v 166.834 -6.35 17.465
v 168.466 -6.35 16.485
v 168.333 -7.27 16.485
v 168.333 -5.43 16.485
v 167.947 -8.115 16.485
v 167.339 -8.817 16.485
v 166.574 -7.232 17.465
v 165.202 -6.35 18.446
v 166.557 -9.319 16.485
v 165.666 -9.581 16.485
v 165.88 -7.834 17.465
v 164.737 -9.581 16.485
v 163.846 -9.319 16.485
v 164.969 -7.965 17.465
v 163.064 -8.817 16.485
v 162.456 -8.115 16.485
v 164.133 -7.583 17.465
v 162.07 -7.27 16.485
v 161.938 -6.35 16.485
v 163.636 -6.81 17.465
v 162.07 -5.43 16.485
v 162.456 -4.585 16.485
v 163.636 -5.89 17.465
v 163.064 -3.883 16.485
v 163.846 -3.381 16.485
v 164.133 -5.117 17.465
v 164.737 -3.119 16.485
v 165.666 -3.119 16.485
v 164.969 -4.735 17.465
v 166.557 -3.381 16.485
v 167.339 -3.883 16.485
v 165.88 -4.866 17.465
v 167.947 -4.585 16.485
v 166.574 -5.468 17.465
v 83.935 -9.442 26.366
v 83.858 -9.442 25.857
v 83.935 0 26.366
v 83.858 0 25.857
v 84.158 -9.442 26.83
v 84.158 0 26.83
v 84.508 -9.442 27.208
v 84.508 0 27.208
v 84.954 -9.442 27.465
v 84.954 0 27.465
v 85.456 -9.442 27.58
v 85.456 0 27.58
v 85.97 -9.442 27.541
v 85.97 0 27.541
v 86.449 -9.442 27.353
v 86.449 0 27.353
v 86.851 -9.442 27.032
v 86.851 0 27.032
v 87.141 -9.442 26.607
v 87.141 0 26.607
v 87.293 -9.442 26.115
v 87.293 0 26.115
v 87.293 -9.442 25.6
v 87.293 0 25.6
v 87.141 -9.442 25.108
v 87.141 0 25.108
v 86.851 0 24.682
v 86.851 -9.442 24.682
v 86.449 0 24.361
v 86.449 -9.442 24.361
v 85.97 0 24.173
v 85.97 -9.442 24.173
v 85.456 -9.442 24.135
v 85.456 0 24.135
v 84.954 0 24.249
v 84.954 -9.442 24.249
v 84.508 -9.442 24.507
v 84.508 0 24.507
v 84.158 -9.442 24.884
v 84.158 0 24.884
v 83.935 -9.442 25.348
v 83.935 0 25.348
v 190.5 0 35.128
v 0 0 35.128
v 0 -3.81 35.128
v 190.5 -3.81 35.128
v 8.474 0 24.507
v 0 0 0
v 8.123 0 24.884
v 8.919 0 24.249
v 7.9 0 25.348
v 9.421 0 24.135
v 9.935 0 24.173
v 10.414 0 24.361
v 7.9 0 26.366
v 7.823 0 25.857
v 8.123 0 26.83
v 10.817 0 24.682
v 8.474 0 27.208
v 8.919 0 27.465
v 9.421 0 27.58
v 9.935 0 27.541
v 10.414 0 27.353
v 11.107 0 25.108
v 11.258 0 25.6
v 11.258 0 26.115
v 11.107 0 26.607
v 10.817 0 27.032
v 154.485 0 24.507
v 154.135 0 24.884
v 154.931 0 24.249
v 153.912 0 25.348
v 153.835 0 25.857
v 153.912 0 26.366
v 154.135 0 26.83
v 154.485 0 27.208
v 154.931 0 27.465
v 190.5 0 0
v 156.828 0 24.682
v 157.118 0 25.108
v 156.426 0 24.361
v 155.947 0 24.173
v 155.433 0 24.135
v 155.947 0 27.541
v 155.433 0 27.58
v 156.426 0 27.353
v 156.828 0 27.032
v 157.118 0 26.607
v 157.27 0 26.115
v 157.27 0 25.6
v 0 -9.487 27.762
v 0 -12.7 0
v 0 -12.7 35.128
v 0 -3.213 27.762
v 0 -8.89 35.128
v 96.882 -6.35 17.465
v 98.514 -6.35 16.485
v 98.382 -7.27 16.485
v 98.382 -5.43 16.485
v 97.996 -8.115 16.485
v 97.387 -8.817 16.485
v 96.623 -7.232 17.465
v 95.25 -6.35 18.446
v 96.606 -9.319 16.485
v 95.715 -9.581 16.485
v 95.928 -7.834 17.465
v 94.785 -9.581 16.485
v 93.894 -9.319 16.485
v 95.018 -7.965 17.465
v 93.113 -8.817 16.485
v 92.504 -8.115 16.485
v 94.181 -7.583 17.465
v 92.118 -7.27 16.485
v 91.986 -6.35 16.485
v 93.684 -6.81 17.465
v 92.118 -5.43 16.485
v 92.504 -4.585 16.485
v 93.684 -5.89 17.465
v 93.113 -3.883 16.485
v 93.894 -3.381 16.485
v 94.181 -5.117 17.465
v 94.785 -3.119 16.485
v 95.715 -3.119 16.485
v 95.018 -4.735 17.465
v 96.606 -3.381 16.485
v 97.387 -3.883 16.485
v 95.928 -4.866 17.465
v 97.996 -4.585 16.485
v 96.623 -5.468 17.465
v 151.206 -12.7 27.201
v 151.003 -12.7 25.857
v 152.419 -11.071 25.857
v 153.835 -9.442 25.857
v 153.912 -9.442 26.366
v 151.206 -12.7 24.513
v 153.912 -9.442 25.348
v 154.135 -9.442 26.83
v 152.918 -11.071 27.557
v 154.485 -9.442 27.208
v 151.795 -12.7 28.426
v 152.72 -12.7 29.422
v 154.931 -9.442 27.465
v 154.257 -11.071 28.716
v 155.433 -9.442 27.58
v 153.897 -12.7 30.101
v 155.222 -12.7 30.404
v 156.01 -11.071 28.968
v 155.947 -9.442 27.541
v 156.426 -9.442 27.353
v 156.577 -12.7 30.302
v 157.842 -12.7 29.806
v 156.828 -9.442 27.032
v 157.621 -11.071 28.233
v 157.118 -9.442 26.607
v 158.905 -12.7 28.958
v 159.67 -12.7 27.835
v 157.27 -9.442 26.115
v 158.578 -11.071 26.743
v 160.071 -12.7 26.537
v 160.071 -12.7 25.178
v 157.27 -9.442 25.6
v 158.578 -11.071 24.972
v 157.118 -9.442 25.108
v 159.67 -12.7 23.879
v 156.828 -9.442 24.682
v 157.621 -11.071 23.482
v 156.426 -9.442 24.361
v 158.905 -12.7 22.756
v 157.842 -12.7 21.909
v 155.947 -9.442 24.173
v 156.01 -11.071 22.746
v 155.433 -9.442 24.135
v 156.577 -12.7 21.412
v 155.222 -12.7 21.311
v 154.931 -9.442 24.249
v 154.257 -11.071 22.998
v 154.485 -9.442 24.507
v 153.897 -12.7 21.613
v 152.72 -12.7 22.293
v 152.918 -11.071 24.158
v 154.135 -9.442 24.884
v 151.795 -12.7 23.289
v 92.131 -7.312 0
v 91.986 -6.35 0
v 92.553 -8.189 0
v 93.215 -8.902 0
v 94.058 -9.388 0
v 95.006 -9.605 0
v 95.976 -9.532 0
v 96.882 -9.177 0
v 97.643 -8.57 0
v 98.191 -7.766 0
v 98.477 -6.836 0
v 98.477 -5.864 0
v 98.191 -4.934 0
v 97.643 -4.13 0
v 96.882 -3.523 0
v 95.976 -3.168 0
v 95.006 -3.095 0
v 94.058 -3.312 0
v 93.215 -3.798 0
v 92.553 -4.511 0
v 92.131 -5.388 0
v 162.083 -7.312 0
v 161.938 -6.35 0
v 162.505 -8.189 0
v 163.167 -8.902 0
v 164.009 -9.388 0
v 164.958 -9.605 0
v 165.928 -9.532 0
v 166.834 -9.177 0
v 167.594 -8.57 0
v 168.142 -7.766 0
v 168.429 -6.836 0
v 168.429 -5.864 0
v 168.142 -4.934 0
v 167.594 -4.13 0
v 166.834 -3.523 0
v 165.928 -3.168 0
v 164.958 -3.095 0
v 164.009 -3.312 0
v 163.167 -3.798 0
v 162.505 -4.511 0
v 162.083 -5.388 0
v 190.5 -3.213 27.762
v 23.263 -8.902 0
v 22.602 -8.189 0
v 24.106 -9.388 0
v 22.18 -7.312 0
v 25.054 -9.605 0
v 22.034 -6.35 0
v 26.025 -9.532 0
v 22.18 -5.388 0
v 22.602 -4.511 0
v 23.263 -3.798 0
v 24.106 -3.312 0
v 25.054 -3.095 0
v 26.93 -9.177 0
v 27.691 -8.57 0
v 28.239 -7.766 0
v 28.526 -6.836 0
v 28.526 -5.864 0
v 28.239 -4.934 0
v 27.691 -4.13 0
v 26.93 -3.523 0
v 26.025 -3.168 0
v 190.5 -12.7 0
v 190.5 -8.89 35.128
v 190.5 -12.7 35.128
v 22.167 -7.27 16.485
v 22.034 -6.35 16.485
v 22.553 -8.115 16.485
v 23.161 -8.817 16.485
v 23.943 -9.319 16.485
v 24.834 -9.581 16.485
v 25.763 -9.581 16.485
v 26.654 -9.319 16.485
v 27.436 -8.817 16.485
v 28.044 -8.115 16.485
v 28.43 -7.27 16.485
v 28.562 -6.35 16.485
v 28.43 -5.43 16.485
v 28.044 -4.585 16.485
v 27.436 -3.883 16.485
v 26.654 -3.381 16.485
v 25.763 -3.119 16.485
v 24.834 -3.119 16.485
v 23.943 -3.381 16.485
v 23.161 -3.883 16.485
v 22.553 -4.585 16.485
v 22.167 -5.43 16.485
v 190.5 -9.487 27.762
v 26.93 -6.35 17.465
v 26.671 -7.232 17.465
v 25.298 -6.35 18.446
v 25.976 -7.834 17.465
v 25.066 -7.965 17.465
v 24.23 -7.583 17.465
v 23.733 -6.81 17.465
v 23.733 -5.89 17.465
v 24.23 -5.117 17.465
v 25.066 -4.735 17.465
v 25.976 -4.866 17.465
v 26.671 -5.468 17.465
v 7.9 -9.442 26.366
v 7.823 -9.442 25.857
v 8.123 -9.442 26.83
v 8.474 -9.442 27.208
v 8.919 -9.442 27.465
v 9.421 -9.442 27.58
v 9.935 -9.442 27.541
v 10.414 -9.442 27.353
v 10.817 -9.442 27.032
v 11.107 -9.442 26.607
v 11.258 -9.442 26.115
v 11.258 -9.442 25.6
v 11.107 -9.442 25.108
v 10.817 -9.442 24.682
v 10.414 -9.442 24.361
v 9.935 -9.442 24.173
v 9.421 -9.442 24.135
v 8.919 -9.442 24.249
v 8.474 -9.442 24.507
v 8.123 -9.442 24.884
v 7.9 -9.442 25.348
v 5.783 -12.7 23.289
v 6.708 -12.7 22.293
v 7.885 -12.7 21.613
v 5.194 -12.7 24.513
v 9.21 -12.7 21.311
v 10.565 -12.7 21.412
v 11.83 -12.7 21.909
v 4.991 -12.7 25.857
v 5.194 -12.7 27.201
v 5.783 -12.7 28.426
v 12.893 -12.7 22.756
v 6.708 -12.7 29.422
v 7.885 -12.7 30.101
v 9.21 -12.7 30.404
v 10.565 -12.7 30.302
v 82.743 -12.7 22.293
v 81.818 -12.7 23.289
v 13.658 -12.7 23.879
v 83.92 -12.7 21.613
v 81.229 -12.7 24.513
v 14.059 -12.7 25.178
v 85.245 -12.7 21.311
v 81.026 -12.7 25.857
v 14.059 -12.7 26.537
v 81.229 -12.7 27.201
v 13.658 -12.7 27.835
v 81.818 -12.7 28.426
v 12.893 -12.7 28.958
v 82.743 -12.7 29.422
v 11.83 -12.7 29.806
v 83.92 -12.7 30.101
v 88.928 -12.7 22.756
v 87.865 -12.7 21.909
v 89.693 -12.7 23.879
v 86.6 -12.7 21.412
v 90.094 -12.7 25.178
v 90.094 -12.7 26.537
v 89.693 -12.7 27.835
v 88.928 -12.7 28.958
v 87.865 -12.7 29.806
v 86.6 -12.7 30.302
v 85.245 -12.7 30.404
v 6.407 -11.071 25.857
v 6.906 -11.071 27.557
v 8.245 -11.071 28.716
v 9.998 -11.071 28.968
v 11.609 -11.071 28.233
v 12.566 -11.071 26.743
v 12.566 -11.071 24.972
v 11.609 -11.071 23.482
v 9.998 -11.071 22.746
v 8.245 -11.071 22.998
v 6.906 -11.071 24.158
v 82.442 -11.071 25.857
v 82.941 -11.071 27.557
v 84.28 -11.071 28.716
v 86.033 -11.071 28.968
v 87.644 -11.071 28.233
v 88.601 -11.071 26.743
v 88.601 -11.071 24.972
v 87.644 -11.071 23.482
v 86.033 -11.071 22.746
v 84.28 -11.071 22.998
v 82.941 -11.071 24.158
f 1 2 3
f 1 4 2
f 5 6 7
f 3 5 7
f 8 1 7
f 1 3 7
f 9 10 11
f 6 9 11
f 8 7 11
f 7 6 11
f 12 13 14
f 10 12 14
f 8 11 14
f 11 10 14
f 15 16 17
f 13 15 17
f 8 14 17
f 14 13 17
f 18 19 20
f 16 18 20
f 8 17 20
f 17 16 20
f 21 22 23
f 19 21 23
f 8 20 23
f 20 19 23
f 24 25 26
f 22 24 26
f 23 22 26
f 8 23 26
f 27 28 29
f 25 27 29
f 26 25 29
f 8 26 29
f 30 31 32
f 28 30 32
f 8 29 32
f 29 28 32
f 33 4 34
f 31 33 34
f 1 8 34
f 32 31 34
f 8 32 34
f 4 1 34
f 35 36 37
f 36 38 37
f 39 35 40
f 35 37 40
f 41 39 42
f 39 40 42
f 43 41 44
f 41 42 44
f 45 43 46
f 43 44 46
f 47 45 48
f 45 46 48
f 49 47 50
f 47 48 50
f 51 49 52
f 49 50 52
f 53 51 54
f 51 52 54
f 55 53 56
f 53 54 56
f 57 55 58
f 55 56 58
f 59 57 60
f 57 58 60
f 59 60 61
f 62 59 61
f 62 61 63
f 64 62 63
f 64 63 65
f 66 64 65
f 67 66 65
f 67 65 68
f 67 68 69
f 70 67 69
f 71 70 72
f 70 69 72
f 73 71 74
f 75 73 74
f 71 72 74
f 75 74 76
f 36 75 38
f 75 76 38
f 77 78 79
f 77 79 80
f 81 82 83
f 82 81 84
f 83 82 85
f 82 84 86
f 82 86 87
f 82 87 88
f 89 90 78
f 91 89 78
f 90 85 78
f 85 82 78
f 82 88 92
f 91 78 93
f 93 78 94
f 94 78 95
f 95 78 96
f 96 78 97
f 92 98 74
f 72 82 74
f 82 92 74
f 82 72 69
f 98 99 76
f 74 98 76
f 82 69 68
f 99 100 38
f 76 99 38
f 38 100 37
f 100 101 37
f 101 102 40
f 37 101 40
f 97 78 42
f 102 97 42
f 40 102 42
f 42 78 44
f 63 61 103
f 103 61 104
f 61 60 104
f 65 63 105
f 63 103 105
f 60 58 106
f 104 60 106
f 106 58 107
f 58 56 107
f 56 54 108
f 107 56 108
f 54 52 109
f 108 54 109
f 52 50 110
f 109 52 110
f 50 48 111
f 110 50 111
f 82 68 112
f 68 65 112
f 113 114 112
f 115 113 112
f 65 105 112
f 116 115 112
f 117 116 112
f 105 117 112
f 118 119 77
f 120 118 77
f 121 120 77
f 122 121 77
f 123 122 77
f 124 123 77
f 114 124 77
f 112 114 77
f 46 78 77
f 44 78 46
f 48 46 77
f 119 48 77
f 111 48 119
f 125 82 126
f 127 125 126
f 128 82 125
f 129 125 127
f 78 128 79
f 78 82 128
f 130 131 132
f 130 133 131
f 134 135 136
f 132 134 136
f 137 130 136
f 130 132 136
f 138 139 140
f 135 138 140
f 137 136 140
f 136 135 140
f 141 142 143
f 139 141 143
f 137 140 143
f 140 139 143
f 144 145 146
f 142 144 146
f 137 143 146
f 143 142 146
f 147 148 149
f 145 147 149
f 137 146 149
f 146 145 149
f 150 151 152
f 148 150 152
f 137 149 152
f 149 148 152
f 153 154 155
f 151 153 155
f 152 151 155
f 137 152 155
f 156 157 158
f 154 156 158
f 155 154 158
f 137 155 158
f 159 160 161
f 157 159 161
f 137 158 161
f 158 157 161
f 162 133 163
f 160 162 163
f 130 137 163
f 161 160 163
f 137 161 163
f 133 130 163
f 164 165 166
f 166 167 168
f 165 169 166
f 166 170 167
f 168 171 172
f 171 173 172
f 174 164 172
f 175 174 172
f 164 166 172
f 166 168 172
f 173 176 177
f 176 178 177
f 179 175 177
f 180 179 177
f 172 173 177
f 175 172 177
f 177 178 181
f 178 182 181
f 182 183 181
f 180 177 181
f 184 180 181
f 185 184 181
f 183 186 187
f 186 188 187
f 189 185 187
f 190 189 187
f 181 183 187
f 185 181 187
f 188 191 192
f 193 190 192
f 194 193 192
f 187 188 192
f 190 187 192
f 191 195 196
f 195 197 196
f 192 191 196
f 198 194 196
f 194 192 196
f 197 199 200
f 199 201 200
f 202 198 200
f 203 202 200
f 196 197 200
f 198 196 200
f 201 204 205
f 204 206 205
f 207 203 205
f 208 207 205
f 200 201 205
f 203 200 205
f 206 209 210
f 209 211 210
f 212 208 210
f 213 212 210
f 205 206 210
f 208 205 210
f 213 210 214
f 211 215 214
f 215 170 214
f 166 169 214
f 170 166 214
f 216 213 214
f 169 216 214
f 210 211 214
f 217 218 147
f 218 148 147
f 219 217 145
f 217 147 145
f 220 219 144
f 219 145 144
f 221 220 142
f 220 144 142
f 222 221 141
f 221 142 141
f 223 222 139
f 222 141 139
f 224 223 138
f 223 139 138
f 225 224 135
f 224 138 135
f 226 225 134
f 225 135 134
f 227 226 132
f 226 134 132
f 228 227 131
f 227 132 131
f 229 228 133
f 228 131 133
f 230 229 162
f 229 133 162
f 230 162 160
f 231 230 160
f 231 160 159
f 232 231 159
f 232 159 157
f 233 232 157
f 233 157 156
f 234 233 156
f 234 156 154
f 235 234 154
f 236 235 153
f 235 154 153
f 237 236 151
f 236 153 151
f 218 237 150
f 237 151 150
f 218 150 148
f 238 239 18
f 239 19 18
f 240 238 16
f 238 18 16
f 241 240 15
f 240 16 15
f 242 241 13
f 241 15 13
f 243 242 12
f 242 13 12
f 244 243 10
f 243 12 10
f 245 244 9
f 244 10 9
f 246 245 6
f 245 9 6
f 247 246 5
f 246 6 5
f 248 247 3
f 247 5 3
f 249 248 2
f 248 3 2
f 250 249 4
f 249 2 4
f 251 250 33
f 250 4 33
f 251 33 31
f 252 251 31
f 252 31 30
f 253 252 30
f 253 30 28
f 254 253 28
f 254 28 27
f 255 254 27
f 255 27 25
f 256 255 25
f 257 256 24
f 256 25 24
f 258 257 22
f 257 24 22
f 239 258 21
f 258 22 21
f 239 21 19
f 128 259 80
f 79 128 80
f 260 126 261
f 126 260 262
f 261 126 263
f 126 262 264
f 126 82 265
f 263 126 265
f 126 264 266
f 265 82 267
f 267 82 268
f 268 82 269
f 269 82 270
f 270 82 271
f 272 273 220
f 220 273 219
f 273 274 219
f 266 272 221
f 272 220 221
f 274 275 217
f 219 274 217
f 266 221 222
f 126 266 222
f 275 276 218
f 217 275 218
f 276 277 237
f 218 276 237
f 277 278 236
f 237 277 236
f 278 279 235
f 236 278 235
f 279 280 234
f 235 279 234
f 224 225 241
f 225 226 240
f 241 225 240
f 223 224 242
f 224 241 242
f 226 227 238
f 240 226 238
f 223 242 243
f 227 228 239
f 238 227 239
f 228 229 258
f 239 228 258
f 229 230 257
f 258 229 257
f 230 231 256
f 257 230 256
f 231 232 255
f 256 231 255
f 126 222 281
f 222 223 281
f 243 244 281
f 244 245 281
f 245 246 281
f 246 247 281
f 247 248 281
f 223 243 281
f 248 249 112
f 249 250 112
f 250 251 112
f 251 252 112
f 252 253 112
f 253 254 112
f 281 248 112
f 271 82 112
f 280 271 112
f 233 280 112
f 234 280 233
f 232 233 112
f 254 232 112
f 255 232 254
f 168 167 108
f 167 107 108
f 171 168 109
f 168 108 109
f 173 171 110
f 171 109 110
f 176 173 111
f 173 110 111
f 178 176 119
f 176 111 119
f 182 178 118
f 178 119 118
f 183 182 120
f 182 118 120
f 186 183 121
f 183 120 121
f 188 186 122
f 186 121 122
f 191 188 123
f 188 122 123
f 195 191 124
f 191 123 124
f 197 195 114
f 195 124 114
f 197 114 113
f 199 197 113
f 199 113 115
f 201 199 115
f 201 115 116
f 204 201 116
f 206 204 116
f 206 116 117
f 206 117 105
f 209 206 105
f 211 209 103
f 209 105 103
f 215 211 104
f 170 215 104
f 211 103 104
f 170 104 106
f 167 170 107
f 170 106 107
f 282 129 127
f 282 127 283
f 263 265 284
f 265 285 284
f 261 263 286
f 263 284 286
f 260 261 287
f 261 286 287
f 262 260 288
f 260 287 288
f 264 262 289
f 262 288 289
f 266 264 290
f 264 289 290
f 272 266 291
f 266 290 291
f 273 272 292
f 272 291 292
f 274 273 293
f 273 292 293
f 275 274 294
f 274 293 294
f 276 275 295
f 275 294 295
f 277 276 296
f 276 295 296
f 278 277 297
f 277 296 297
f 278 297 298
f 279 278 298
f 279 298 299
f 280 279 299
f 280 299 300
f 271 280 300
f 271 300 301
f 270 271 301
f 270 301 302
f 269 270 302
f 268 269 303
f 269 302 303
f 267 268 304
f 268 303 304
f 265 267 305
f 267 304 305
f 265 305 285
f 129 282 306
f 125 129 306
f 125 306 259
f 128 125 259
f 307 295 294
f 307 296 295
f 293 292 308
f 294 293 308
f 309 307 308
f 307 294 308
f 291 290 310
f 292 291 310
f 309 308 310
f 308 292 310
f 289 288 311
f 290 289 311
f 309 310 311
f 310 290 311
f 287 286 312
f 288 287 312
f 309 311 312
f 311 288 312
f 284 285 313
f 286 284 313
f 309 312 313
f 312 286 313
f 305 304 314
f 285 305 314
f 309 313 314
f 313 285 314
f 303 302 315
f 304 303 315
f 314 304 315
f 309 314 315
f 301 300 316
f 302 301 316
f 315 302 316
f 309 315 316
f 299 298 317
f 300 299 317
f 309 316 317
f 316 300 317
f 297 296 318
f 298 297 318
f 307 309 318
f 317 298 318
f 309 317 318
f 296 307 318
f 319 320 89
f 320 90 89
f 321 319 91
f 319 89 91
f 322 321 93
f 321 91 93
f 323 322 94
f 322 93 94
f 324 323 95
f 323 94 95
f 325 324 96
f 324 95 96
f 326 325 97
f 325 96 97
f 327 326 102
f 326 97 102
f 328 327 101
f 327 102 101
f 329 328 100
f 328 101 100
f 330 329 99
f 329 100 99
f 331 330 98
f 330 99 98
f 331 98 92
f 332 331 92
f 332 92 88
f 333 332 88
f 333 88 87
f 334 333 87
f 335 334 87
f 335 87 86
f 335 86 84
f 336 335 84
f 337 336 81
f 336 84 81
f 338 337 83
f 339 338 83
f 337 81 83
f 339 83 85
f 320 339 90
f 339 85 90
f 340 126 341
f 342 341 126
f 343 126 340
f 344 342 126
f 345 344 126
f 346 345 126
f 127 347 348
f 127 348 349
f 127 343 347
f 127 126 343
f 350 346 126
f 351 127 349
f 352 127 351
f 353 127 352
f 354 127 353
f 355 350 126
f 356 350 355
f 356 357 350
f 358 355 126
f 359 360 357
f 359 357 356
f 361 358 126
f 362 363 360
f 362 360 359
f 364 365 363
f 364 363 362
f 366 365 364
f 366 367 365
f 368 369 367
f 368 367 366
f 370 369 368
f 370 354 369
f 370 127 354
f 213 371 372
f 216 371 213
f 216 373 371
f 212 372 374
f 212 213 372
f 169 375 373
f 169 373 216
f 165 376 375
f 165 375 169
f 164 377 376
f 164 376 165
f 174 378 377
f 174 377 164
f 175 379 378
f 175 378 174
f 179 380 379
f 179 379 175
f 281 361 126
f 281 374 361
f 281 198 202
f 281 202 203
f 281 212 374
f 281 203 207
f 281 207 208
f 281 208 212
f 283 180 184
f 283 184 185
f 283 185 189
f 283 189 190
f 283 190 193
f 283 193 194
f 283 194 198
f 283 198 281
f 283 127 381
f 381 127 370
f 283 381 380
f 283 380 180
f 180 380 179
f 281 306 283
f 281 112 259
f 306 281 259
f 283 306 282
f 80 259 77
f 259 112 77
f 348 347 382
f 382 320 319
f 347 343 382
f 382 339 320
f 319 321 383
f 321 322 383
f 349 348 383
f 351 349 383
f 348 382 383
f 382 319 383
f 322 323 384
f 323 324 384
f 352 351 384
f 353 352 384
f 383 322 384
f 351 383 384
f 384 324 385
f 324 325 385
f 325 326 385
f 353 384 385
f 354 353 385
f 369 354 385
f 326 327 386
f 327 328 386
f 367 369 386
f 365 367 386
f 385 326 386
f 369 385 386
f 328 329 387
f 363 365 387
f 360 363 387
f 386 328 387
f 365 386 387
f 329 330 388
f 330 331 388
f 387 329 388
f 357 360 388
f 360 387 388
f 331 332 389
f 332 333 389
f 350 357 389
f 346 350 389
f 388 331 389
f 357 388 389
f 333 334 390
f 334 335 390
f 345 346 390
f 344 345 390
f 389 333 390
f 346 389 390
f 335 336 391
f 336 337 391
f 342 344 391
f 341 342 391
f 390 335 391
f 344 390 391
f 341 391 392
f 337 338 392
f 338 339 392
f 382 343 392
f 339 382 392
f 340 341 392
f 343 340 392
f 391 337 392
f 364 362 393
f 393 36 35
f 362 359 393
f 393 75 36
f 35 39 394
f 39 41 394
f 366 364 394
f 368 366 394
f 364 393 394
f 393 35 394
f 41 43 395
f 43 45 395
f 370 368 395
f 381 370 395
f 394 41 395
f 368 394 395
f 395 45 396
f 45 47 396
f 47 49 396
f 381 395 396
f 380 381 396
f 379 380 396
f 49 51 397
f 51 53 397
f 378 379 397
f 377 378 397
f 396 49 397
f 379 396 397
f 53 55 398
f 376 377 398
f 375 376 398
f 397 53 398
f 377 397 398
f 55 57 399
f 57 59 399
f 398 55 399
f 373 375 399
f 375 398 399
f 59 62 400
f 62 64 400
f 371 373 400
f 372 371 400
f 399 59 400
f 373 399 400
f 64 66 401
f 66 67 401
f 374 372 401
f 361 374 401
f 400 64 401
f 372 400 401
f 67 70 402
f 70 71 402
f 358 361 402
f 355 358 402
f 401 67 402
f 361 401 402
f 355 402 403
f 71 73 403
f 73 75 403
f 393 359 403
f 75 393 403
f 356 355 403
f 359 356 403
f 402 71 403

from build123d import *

# Parameters (mm, degrees)
F0_W           = 190.5
F0_H           = 35.1282
F1_DEPTH       = 12.7
F3_DEPTH       = 190.501
F5_D           = 3.4544
F5_CSINK_D     = 9.1186
F5_CSINK_ANGLE = 82
F7_D           = 6.5278
F7_DEPTH       = 16.4846
F7_TIP         = 1.9611489744


with BuildPart() as f1:
    # F0 (on Front) → F1 (new body)
    with BuildSketch(Plane.XZ):
        with Locations((95.25, 17.5641)):
            Rectangle(F0_W, F0_H)
    extrude(amount=F1_DEPTH)

    # F2 (on face) → F3 (cut, through all)
    with BuildSketch(Plane.YZ.offset(190.5)):
        Polygon((-3.81, 35.1282), (-8.89, 35.1282), (-9.4869, 27.7622), (-3.2131, 27.7622), align=None)
    extrude(amount=-F3_DEPTH, mode=Mode.SUBTRACT)

    # F5 (through all)
    with Locations(Plane.XZ.offset(12.7)):
        with Locations((9.5504, 25.8572), (85.5853, 25.8572), (155.5623, 25.8572)):
            CounterSinkHole(F5_D / 2, F5_CSINK_D / 2, counter_sink_angle=F5_CSINK_ANGLE)

    # F7
    with Locations(Plane(origin=(0, 0, 0), x_dir=(1, 0, 0), z_dir=(0, 0, -1))):
        with Locations((25.2984, 6.35), (95.25, 6.35), (165.2016, 6.35)):
            Hole(F7_D / 2, depth=F7_DEPTH)
            with Locations((0, 0, -(F7_DEPTH + F7_TIP / 2))):  # 118° drill point
                Cone(0, F7_D / 2, F7_TIP, mode=Mode.SUBTRACT)


solid = f1.part
